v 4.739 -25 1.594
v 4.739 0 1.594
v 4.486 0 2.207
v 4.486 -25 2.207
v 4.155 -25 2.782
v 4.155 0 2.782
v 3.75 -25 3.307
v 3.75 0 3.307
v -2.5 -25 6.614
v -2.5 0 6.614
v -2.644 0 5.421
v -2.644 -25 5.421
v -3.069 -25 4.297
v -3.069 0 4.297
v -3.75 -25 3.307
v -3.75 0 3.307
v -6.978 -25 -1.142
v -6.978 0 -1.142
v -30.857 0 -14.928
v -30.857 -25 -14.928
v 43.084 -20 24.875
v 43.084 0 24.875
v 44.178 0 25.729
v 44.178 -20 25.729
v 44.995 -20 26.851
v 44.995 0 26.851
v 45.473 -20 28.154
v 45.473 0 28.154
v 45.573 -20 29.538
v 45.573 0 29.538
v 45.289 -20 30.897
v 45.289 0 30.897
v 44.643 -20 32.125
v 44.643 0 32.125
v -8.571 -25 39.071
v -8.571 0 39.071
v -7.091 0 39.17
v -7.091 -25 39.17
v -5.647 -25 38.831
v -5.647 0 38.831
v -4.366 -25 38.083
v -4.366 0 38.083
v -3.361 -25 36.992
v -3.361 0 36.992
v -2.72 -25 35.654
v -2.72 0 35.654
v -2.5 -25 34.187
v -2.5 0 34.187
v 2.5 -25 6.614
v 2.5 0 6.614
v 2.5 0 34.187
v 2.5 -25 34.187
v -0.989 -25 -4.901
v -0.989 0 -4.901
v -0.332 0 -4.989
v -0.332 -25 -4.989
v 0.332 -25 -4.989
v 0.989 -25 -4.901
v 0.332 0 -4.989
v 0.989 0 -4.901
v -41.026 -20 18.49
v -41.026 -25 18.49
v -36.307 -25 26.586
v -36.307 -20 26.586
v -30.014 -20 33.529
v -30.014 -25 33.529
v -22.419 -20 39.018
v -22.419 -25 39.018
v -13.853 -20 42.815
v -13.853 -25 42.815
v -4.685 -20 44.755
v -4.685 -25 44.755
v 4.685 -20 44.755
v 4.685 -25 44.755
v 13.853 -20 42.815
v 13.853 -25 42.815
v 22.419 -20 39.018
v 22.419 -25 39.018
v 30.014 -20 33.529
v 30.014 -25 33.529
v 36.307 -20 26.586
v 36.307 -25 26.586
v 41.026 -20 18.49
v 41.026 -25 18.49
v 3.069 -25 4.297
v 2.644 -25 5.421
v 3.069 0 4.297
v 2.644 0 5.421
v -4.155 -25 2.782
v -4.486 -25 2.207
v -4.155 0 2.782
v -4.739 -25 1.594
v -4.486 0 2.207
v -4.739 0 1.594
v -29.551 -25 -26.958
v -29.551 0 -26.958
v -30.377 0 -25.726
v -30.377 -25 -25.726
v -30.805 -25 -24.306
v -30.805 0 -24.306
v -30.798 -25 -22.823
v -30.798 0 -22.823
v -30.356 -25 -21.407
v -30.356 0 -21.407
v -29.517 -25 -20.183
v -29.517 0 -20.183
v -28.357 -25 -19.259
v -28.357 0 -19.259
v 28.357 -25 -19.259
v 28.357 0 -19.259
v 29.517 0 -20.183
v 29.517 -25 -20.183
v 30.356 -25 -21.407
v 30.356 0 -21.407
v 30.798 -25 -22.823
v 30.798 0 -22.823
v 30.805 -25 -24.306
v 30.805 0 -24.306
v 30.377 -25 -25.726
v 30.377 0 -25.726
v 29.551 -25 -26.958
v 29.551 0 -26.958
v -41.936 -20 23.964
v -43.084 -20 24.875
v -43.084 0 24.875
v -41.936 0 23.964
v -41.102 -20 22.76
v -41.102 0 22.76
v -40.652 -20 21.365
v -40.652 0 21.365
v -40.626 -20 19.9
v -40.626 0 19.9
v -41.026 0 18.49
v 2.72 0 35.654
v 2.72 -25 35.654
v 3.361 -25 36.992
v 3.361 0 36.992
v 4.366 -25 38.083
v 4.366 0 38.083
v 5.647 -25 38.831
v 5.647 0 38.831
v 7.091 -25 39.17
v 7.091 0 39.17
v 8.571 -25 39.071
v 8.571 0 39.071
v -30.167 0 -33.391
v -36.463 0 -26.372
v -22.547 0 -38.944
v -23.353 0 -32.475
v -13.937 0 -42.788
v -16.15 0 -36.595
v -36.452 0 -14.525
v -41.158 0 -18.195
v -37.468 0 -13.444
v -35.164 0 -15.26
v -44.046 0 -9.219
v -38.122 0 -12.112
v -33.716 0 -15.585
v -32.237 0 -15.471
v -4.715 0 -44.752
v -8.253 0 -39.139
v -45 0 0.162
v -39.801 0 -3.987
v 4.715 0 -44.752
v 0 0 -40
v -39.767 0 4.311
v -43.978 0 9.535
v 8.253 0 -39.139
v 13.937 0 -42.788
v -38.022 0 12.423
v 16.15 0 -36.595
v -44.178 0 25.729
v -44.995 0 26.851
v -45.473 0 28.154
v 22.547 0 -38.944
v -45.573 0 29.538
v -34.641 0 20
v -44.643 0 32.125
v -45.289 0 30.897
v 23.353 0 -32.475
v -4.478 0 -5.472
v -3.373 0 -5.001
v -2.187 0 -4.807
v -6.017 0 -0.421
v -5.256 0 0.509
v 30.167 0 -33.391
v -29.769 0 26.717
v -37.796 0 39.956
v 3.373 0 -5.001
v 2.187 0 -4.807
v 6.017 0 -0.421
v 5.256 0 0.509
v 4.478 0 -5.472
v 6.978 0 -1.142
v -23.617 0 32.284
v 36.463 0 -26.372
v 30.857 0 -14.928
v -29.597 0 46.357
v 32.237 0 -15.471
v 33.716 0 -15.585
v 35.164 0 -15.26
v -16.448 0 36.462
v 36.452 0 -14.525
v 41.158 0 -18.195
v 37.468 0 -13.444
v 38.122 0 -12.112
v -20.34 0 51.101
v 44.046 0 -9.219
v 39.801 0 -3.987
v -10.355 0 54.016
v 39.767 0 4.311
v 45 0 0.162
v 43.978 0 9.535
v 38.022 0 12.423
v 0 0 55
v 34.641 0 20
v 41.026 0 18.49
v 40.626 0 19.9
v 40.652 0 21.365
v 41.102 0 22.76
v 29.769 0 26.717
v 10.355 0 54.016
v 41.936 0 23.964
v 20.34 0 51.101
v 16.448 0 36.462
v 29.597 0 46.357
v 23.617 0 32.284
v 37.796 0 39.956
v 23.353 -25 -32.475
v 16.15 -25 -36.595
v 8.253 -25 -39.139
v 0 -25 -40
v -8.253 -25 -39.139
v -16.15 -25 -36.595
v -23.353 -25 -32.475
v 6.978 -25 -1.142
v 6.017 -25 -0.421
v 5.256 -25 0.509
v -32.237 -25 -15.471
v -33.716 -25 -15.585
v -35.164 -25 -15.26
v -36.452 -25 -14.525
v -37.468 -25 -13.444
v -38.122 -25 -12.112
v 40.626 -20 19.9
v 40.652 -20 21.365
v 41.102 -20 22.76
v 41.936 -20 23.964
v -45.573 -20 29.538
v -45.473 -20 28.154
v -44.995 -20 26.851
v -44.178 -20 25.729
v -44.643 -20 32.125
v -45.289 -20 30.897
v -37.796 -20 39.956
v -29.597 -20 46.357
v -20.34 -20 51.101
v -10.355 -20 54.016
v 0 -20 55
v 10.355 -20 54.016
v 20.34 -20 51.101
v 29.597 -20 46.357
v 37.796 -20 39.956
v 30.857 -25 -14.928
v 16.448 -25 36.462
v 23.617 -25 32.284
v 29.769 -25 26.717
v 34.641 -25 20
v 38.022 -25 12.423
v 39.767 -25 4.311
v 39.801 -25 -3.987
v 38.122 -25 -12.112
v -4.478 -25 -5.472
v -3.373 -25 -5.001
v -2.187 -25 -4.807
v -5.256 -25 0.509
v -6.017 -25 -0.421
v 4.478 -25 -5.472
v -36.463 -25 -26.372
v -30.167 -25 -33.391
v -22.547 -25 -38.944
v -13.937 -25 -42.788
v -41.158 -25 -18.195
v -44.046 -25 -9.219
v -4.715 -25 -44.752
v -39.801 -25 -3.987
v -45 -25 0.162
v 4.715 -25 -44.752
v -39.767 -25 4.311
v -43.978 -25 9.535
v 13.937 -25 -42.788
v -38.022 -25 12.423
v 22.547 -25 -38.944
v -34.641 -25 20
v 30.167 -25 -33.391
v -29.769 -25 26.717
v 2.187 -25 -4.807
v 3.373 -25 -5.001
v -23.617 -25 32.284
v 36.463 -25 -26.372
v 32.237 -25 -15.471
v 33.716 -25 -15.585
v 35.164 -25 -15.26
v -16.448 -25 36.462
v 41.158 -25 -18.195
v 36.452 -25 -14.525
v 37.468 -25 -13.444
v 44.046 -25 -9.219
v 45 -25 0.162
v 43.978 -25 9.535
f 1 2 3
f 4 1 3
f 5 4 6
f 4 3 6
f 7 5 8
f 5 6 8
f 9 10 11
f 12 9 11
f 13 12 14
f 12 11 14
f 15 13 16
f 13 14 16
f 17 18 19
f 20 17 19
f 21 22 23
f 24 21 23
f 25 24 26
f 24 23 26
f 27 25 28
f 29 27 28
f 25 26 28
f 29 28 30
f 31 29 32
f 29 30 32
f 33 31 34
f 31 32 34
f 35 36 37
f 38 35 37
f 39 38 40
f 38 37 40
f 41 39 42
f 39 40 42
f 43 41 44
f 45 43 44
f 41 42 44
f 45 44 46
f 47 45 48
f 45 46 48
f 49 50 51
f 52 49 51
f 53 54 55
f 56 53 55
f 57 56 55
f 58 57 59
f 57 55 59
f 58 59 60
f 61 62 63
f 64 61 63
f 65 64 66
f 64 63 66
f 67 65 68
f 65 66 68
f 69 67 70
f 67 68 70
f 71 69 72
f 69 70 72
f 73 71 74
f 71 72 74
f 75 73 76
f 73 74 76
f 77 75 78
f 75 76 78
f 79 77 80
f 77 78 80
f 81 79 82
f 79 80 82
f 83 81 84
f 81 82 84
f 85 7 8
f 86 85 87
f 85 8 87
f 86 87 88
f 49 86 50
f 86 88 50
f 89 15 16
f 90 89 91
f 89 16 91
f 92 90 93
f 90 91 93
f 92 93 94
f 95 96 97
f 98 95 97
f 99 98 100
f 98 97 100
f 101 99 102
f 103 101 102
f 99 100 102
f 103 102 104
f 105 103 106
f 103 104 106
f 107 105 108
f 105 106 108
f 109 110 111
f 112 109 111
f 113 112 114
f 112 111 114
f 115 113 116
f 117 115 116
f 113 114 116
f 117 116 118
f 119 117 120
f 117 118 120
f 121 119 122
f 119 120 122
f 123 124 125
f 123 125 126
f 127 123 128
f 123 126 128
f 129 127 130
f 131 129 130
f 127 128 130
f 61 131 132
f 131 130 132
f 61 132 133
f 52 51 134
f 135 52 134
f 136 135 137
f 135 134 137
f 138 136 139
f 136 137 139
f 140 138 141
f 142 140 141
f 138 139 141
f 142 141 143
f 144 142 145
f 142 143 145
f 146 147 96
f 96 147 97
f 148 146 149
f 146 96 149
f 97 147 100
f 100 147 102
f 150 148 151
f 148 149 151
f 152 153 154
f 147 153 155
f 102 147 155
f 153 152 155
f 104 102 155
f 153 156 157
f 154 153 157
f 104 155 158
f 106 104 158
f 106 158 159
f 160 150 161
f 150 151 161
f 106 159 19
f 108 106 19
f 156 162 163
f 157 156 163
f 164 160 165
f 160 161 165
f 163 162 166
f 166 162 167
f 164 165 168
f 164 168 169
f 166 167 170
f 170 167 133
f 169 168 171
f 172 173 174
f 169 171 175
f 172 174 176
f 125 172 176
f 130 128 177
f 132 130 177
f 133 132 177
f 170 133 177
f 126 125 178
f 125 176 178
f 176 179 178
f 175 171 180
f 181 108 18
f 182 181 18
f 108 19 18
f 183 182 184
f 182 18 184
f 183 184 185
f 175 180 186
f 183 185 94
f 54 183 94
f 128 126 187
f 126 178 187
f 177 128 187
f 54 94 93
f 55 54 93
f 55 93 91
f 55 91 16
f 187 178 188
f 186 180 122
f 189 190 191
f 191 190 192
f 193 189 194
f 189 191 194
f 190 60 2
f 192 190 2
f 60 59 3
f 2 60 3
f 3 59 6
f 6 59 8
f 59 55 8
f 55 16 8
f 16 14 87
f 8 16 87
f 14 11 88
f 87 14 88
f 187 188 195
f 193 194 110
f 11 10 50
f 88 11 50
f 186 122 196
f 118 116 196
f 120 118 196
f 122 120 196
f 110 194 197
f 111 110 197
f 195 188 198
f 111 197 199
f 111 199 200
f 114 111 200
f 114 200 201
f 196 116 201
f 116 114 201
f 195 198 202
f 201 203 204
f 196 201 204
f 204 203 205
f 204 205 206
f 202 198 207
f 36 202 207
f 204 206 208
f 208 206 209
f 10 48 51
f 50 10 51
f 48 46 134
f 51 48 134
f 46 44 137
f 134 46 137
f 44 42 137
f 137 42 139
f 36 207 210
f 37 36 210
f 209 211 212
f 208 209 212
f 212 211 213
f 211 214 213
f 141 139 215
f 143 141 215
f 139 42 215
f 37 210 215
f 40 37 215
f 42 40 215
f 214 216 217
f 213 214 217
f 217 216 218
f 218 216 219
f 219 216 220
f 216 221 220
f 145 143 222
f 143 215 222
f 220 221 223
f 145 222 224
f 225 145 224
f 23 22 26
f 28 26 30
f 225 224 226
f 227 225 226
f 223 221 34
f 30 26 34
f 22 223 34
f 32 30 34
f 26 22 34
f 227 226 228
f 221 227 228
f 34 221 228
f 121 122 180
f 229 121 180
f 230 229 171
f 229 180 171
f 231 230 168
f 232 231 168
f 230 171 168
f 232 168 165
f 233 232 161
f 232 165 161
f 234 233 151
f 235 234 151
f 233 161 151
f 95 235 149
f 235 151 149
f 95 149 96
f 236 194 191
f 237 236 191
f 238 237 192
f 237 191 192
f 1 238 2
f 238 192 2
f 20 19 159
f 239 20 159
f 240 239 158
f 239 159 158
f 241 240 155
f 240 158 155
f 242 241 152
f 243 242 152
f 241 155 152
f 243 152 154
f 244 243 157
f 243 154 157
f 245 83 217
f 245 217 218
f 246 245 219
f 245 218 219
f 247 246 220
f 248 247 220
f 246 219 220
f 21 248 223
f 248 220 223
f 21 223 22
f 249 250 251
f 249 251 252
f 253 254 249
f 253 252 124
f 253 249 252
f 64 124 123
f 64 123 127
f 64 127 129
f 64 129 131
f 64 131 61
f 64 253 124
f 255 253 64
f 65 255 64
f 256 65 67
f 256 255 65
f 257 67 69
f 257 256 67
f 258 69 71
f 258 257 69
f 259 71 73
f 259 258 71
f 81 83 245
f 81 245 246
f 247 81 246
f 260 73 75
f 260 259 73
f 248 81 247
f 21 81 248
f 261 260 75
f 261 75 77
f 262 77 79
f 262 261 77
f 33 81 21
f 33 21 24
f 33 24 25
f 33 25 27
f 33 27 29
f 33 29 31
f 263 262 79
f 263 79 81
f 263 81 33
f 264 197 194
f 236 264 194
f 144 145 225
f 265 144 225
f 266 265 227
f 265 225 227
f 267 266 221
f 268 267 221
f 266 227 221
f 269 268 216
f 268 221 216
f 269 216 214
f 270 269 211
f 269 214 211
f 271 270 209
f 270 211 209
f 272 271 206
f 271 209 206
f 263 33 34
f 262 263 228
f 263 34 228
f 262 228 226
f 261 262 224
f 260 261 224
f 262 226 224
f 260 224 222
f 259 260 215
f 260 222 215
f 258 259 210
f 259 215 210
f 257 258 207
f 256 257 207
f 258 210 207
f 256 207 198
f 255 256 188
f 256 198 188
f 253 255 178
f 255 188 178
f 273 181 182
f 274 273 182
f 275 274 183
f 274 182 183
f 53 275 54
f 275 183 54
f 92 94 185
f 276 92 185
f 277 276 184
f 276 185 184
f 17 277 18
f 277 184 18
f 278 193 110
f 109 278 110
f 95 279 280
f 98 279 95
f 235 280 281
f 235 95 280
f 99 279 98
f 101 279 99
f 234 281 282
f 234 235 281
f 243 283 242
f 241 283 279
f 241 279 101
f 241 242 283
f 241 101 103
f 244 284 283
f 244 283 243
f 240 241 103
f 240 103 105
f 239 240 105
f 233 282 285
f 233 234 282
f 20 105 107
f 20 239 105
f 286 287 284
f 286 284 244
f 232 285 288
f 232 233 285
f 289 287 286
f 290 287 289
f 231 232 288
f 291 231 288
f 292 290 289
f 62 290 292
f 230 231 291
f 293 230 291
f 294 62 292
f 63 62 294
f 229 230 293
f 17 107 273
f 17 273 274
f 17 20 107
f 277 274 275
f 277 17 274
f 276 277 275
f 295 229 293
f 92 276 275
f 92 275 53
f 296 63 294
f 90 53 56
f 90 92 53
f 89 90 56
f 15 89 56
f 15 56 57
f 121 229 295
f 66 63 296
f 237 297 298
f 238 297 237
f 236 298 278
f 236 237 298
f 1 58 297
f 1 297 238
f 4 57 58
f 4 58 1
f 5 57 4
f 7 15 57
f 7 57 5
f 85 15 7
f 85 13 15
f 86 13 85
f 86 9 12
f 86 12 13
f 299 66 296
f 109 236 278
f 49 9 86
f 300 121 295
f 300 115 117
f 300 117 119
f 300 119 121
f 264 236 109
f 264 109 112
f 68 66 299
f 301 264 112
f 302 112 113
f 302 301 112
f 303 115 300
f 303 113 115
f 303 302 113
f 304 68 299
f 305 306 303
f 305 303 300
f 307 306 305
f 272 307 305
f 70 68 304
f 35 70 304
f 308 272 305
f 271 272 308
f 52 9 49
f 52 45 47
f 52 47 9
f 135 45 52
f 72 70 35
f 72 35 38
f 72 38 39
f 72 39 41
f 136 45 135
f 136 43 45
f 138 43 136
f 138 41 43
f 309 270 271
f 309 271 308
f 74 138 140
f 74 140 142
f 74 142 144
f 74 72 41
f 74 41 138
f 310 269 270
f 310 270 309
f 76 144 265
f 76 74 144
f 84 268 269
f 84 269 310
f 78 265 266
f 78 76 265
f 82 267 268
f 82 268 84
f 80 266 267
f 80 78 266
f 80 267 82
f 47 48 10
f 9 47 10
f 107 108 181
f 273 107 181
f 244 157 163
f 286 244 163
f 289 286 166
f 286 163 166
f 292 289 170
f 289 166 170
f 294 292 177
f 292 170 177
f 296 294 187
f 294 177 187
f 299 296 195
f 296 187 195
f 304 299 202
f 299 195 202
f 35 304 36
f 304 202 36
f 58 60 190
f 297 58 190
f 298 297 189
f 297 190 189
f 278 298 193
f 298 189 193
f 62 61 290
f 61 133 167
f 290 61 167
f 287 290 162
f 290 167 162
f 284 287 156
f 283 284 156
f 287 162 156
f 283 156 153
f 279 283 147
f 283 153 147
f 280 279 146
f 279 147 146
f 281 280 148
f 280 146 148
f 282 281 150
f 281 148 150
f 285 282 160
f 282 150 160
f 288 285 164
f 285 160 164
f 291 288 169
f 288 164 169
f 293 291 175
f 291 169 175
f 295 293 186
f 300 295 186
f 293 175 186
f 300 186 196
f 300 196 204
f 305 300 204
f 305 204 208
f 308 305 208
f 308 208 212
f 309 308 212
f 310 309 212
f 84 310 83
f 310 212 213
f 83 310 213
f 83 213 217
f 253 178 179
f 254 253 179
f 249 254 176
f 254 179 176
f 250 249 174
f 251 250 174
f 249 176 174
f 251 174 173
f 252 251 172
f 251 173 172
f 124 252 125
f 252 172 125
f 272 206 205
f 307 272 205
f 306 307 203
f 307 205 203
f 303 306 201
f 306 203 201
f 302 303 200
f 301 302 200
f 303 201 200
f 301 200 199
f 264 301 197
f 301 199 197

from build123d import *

# Parameters (mm, degrees)
F1_DEPTH = 25
F3_DEPTH = 5


with BuildPart() as f1:
    # F0 (on Front) → F1 (new body)
    with BuildSketch(Plane.XZ):
        with BuildLine():
            ThreePointArc((-43.08422, 24.874686), (-40.825433, 22.078816), (-41.025798, 18.490103))
            ThreePointArc((-41.025798, 18.490103), (0, -45), (41.025798, 18.490103))
            ThreePointArc((41.025798, 18.490103), (40.825433, 22.078816), (43.08422, 24.874686))
            ThreePointArc((43.08422, 24.874686), (45.472579, 28.154125), (44.642642, 32.125294))
            ThreePointArc((44.642642, 32.125294), (0, 55), (-44.642642, 32.125294))
            ThreePointArc((-44.642642, 32.125294), (-45.472579, 28.154125), (-43.08422, 24.874686))
        make_face()
        with BuildLine():
            ThreePointArc((-4.47822, -5.472253), (-2.785824, -4.868033), (-0.98911, -4.90119))
            ThreePointArc((-0.98911, -4.90119), (0, -5), (0.98911, -4.90119))
            ThreePointArc((0.98911, -4.90119), (2.785824, -4.868033), (4.47822, -5.472253))
            Line((4.47822, -5.472253), (28.356798, -19.258556))
            ThreePointArc((28.356798, -19.258556), (30.797764, -22.822617), (29.550627, -26.958495))
            ThreePointArc((29.550627, -26.958495), (0, -40), (-29.550627, -26.958495))
            ThreePointArc((-29.550627, -26.958495), (-30.797764, -22.822617), (-28.356798, -19.258556))
            Line((-28.356798, -19.258556), (-4.47822, -5.472253))
        make_face(mode=Mode.SUBTRACT)
        with BuildLine():
            ThreePointArc((-38.122055, -12.112346), (-34.641016, 20), (-8.571429, 39.070841))
            ThreePointArc((-8.571429, 39.070841), (-4.366084, 38.082954), (-2.5, 34.186986))
            Line((-2.5, 34.186986), (-2.5, 6.614378))
            ThreePointArc((-2.5, 6.614378), (-2.822928, 4.846611), (-3.75, 3.307189))
            ThreePointArc((-3.75, 3.307189), (-4.330127, 2.5), (-4.73911, 1.594001))
            ThreePointArc((-4.73911, 1.594001), (-5.608753, 0.021422), (-6.97822, -1.142126))
            Line((-6.97822, -1.142126), (-30.856798, -14.928429))
            ThreePointArc((-30.856798, -14.928429), (-35.163848, -15.260337), (-38.122055, -12.112346))
        make_face(mode=Mode.SUBTRACT)
        with BuildLine():
            ThreePointArc((3.75, 3.307189), (2.822928, 4.846611), (2.5, 6.614378))
            Line((2.5, 6.614378), (2.5, 34.186986))
            ThreePointArc((2.5, 34.186986), (4.366084, 38.082954), (8.571429, 39.070841))
            ThreePointArc((8.571429, 39.070841), (34.641016, 20), (38.122055, -12.112346))
            ThreePointArc((38.122055, -12.112346), (35.163848, -15.260337), (30.856798, -14.928429))
            Line((30.856798, -14.928429), (6.97822, -1.142126))
            ThreePointArc((6.97822, -1.142126), (5.608753, 0.021422), (4.73911, 1.594001))
            ThreePointArc((4.73911, 1.594001), (4.330127, 2.5), (3.75, 3.307189))
        make_face(mode=Mode.SUBTRACT)
    extrude(amount=F1_DEPTH)

    # F2 (on face) → F3 (cut)
    with BuildSketch(Plane.XZ.offset(25)):
        with BuildLine():
            ThreePointArc((-41.025798, 18.490103), (0, 45), (41.025798, 18.490103))
            ThreePointArc((41.025798, 18.490103), (40.825433, 22.078816), (43.08422, 24.874686))
            ThreePointArc((43.08422, 24.874686), (45.472579, 28.154125), (44.642642, 32.125294))
            ThreePointArc((44.642642, 32.125294), (0, 55), (-44.642642, 32.125294))
            ThreePointArc((-44.642642, 32.125294), (-45.472579, 28.154125), (-43.08422, 24.874686))
            ThreePointArc((-43.08422, 24.874686), (-40.825433, 22.078816), (-41.025798, 18.490103))
        make_face()
    extrude(amount=-F3_DEPTH, mode=Mode.SUBTRACT)


solid = f1.part
